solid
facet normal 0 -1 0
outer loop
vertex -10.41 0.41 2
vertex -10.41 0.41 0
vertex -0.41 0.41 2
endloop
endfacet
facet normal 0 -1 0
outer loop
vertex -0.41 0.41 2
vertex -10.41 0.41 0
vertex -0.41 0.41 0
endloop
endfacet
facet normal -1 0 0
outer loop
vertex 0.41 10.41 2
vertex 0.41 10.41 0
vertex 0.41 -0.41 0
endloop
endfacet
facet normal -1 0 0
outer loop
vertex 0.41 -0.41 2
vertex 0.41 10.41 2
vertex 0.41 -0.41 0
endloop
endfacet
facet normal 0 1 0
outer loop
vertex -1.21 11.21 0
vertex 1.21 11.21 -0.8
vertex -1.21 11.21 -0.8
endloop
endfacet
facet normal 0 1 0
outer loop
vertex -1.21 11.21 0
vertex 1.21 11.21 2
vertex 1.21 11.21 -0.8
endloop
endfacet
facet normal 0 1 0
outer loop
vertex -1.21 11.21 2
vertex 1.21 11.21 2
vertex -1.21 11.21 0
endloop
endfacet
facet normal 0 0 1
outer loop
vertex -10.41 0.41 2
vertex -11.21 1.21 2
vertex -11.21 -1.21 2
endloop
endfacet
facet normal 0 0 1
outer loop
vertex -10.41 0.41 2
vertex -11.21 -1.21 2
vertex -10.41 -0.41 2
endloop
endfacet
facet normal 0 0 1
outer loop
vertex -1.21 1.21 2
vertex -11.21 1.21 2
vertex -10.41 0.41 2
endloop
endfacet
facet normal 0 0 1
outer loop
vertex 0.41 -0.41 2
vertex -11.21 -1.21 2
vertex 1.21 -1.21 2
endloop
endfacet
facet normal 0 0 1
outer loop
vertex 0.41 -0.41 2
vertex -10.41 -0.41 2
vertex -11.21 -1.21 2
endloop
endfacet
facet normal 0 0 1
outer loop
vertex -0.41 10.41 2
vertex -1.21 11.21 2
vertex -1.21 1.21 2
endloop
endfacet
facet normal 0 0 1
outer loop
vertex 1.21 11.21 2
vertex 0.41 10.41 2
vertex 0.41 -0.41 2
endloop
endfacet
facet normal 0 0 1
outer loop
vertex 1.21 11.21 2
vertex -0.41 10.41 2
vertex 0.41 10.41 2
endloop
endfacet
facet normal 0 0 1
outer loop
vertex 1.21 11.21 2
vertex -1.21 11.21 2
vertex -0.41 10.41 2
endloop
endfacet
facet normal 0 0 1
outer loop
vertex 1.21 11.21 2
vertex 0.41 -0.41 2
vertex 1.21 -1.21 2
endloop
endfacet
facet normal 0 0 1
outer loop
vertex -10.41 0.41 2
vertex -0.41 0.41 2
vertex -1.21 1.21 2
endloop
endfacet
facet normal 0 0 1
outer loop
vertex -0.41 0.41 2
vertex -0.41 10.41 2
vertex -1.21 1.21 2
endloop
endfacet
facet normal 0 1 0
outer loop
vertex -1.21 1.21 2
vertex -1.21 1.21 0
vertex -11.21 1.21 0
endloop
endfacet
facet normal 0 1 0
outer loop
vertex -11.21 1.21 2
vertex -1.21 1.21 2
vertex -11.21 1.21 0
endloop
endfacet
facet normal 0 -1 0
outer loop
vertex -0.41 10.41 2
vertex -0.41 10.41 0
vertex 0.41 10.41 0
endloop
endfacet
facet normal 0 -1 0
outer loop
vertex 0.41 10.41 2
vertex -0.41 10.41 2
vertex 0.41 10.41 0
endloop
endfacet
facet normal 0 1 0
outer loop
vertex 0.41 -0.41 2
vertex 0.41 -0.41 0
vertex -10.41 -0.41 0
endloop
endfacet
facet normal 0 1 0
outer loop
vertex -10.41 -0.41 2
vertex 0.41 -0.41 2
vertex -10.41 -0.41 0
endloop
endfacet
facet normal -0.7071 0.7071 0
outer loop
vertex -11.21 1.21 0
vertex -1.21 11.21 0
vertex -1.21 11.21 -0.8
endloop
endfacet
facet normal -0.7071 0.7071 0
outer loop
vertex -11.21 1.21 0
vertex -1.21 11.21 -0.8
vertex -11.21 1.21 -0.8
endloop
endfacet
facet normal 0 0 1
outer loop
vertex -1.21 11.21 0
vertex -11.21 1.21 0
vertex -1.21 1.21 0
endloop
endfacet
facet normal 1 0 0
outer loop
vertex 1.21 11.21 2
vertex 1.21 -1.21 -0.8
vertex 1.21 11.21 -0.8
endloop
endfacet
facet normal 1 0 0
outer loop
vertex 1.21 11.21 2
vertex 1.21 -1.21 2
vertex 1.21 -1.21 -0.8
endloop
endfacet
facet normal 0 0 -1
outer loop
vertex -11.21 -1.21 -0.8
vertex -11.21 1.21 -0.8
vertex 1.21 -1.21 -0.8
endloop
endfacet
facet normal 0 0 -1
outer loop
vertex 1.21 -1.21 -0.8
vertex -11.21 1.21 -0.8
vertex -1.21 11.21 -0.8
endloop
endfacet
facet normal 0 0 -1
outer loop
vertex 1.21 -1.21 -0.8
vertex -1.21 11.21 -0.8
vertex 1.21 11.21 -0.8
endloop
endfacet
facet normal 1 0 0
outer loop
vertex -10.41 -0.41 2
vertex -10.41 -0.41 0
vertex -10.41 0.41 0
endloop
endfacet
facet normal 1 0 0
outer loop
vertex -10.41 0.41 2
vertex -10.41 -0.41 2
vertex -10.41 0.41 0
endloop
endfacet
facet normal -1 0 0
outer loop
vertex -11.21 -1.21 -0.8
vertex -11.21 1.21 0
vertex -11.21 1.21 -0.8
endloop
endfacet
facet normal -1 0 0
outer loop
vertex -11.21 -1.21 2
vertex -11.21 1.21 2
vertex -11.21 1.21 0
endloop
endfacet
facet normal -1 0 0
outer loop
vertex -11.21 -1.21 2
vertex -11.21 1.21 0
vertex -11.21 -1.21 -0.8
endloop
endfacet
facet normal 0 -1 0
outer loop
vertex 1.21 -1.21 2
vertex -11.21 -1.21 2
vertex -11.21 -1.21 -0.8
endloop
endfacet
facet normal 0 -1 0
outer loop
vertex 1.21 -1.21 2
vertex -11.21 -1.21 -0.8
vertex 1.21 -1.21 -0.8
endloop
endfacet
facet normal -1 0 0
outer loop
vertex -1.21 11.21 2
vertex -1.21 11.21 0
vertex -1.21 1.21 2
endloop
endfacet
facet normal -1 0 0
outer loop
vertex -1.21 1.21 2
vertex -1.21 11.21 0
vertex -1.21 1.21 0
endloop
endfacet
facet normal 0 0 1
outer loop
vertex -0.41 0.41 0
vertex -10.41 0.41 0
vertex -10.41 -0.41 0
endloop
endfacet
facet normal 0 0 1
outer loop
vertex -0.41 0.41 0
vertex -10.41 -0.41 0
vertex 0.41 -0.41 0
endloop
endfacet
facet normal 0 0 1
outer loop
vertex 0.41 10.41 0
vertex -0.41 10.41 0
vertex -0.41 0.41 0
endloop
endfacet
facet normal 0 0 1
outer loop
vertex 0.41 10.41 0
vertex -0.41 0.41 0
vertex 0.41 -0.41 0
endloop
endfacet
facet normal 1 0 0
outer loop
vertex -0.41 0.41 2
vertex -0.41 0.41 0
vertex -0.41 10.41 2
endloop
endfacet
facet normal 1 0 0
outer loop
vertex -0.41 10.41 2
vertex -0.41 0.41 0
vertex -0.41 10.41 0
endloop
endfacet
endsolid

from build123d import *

# Parameters (mm, degrees)
F0_W     = 0.82
F0_H     = 0.8
F0_W_2   = 0.8
F0_H_2   = 0.82
F1_DEPTH = 2
F2_DEPTH = 0.8


with BuildPart() as f1:
    # F0 (on Top) → F1 (new body)
    with BuildSketch(Plane.XY):
        Polygon((-10.41, 0.41), (-0.41, 0.41), (-0.41, 10.41), (0.41, 10.41), (0.41, 0.41), (1.21, 0.41), (1.21, 1.21), (1.21, 11.21), (-1.21, 11.21), (-1.21, 1.21), (-11.21, 1.21), (-11.21, -1.21), (-1.21, -1.21), (-0.41, -1.21), (-0.41, -0.41), (-10.41, -0.41), align=None)
        with Locations((0, -0.81)):
            Rectangle(F0_W, F0_H)
        with Locations((0.81, 0)):
            Rectangle(F0_W_2, F0_H_2)
        with Locations((0.81, -0.81)):
            Rectangle(F0_W_2, F0_H)
    extrude(amount=F1_DEPTH)

    # F0 (on Top) + F1_face (on face) → F2 (join)
    with BuildSketch(Plane.XY):
        Polygon((-1.21, 1.21), (-1.21, 11.21), (-11.21, 1.21), align=None)
        Polygon((-10.41, 0.41), (-0.41, 0.41), (-0.41, 10.41), (0.41, 10.41), (0.41, 0.41), (1.21, 0.41), (1.21, 1.21), (1.21, 11.21), (-1.21, 11.21), (-1.21, 1.21), (-11.21, 1.21), (-11.21, -1.21), (-1.21, -1.21), (-0.41, -1.21), (-0.41, -0.41), (-10.41, -0.41), align=None)
        Polygon((-0.41, 10.41), (-0.41, 0.41), (-10.41, 0.41), (-10.41, -0.41), (-0.41, -0.41), (0.41, -0.41), (0.41, 0.41), (0.41, 10.41), align=None)
        with Locations((0, -0.81)):
            Rectangle(F0_W, F0_H)
        with Locations((0.81, 0)):
            Rectangle(F0_W_2, F0_H_2)
        with Locations((0.81, -0.81)):
            Rectangle(F0_W_2, F0_H)
    with BuildSketch(Plane(origin=(-2.8485370052, 2.8485370052, 2), x_dir=(1, 0, 0), z_dir=(0, 0, 1))):
        Polygon((-8.3614629948, -4.0585370052), (4.0585370052, -4.0585370052), (4.0585370052, 8.3614629948), (1.6385370052, 8.3614629948), (1.6385370052, -1.6385370052), (-8.3614629948, -1.6385370052), align=None)
        Polygon((3.2585370052, 7.5614629948), (3.2585370052, -3.2585370052), (-7.5614629948, -3.2585370052), (-7.5614629948, -2.4385370052), (2.4385370052, -2.4385370052), (2.4385370052, 7.5614629948), align=None, mode=Mode.SUBTRACT)
    extrude(amount=-F2_DEPTH)


solid = f1.part
